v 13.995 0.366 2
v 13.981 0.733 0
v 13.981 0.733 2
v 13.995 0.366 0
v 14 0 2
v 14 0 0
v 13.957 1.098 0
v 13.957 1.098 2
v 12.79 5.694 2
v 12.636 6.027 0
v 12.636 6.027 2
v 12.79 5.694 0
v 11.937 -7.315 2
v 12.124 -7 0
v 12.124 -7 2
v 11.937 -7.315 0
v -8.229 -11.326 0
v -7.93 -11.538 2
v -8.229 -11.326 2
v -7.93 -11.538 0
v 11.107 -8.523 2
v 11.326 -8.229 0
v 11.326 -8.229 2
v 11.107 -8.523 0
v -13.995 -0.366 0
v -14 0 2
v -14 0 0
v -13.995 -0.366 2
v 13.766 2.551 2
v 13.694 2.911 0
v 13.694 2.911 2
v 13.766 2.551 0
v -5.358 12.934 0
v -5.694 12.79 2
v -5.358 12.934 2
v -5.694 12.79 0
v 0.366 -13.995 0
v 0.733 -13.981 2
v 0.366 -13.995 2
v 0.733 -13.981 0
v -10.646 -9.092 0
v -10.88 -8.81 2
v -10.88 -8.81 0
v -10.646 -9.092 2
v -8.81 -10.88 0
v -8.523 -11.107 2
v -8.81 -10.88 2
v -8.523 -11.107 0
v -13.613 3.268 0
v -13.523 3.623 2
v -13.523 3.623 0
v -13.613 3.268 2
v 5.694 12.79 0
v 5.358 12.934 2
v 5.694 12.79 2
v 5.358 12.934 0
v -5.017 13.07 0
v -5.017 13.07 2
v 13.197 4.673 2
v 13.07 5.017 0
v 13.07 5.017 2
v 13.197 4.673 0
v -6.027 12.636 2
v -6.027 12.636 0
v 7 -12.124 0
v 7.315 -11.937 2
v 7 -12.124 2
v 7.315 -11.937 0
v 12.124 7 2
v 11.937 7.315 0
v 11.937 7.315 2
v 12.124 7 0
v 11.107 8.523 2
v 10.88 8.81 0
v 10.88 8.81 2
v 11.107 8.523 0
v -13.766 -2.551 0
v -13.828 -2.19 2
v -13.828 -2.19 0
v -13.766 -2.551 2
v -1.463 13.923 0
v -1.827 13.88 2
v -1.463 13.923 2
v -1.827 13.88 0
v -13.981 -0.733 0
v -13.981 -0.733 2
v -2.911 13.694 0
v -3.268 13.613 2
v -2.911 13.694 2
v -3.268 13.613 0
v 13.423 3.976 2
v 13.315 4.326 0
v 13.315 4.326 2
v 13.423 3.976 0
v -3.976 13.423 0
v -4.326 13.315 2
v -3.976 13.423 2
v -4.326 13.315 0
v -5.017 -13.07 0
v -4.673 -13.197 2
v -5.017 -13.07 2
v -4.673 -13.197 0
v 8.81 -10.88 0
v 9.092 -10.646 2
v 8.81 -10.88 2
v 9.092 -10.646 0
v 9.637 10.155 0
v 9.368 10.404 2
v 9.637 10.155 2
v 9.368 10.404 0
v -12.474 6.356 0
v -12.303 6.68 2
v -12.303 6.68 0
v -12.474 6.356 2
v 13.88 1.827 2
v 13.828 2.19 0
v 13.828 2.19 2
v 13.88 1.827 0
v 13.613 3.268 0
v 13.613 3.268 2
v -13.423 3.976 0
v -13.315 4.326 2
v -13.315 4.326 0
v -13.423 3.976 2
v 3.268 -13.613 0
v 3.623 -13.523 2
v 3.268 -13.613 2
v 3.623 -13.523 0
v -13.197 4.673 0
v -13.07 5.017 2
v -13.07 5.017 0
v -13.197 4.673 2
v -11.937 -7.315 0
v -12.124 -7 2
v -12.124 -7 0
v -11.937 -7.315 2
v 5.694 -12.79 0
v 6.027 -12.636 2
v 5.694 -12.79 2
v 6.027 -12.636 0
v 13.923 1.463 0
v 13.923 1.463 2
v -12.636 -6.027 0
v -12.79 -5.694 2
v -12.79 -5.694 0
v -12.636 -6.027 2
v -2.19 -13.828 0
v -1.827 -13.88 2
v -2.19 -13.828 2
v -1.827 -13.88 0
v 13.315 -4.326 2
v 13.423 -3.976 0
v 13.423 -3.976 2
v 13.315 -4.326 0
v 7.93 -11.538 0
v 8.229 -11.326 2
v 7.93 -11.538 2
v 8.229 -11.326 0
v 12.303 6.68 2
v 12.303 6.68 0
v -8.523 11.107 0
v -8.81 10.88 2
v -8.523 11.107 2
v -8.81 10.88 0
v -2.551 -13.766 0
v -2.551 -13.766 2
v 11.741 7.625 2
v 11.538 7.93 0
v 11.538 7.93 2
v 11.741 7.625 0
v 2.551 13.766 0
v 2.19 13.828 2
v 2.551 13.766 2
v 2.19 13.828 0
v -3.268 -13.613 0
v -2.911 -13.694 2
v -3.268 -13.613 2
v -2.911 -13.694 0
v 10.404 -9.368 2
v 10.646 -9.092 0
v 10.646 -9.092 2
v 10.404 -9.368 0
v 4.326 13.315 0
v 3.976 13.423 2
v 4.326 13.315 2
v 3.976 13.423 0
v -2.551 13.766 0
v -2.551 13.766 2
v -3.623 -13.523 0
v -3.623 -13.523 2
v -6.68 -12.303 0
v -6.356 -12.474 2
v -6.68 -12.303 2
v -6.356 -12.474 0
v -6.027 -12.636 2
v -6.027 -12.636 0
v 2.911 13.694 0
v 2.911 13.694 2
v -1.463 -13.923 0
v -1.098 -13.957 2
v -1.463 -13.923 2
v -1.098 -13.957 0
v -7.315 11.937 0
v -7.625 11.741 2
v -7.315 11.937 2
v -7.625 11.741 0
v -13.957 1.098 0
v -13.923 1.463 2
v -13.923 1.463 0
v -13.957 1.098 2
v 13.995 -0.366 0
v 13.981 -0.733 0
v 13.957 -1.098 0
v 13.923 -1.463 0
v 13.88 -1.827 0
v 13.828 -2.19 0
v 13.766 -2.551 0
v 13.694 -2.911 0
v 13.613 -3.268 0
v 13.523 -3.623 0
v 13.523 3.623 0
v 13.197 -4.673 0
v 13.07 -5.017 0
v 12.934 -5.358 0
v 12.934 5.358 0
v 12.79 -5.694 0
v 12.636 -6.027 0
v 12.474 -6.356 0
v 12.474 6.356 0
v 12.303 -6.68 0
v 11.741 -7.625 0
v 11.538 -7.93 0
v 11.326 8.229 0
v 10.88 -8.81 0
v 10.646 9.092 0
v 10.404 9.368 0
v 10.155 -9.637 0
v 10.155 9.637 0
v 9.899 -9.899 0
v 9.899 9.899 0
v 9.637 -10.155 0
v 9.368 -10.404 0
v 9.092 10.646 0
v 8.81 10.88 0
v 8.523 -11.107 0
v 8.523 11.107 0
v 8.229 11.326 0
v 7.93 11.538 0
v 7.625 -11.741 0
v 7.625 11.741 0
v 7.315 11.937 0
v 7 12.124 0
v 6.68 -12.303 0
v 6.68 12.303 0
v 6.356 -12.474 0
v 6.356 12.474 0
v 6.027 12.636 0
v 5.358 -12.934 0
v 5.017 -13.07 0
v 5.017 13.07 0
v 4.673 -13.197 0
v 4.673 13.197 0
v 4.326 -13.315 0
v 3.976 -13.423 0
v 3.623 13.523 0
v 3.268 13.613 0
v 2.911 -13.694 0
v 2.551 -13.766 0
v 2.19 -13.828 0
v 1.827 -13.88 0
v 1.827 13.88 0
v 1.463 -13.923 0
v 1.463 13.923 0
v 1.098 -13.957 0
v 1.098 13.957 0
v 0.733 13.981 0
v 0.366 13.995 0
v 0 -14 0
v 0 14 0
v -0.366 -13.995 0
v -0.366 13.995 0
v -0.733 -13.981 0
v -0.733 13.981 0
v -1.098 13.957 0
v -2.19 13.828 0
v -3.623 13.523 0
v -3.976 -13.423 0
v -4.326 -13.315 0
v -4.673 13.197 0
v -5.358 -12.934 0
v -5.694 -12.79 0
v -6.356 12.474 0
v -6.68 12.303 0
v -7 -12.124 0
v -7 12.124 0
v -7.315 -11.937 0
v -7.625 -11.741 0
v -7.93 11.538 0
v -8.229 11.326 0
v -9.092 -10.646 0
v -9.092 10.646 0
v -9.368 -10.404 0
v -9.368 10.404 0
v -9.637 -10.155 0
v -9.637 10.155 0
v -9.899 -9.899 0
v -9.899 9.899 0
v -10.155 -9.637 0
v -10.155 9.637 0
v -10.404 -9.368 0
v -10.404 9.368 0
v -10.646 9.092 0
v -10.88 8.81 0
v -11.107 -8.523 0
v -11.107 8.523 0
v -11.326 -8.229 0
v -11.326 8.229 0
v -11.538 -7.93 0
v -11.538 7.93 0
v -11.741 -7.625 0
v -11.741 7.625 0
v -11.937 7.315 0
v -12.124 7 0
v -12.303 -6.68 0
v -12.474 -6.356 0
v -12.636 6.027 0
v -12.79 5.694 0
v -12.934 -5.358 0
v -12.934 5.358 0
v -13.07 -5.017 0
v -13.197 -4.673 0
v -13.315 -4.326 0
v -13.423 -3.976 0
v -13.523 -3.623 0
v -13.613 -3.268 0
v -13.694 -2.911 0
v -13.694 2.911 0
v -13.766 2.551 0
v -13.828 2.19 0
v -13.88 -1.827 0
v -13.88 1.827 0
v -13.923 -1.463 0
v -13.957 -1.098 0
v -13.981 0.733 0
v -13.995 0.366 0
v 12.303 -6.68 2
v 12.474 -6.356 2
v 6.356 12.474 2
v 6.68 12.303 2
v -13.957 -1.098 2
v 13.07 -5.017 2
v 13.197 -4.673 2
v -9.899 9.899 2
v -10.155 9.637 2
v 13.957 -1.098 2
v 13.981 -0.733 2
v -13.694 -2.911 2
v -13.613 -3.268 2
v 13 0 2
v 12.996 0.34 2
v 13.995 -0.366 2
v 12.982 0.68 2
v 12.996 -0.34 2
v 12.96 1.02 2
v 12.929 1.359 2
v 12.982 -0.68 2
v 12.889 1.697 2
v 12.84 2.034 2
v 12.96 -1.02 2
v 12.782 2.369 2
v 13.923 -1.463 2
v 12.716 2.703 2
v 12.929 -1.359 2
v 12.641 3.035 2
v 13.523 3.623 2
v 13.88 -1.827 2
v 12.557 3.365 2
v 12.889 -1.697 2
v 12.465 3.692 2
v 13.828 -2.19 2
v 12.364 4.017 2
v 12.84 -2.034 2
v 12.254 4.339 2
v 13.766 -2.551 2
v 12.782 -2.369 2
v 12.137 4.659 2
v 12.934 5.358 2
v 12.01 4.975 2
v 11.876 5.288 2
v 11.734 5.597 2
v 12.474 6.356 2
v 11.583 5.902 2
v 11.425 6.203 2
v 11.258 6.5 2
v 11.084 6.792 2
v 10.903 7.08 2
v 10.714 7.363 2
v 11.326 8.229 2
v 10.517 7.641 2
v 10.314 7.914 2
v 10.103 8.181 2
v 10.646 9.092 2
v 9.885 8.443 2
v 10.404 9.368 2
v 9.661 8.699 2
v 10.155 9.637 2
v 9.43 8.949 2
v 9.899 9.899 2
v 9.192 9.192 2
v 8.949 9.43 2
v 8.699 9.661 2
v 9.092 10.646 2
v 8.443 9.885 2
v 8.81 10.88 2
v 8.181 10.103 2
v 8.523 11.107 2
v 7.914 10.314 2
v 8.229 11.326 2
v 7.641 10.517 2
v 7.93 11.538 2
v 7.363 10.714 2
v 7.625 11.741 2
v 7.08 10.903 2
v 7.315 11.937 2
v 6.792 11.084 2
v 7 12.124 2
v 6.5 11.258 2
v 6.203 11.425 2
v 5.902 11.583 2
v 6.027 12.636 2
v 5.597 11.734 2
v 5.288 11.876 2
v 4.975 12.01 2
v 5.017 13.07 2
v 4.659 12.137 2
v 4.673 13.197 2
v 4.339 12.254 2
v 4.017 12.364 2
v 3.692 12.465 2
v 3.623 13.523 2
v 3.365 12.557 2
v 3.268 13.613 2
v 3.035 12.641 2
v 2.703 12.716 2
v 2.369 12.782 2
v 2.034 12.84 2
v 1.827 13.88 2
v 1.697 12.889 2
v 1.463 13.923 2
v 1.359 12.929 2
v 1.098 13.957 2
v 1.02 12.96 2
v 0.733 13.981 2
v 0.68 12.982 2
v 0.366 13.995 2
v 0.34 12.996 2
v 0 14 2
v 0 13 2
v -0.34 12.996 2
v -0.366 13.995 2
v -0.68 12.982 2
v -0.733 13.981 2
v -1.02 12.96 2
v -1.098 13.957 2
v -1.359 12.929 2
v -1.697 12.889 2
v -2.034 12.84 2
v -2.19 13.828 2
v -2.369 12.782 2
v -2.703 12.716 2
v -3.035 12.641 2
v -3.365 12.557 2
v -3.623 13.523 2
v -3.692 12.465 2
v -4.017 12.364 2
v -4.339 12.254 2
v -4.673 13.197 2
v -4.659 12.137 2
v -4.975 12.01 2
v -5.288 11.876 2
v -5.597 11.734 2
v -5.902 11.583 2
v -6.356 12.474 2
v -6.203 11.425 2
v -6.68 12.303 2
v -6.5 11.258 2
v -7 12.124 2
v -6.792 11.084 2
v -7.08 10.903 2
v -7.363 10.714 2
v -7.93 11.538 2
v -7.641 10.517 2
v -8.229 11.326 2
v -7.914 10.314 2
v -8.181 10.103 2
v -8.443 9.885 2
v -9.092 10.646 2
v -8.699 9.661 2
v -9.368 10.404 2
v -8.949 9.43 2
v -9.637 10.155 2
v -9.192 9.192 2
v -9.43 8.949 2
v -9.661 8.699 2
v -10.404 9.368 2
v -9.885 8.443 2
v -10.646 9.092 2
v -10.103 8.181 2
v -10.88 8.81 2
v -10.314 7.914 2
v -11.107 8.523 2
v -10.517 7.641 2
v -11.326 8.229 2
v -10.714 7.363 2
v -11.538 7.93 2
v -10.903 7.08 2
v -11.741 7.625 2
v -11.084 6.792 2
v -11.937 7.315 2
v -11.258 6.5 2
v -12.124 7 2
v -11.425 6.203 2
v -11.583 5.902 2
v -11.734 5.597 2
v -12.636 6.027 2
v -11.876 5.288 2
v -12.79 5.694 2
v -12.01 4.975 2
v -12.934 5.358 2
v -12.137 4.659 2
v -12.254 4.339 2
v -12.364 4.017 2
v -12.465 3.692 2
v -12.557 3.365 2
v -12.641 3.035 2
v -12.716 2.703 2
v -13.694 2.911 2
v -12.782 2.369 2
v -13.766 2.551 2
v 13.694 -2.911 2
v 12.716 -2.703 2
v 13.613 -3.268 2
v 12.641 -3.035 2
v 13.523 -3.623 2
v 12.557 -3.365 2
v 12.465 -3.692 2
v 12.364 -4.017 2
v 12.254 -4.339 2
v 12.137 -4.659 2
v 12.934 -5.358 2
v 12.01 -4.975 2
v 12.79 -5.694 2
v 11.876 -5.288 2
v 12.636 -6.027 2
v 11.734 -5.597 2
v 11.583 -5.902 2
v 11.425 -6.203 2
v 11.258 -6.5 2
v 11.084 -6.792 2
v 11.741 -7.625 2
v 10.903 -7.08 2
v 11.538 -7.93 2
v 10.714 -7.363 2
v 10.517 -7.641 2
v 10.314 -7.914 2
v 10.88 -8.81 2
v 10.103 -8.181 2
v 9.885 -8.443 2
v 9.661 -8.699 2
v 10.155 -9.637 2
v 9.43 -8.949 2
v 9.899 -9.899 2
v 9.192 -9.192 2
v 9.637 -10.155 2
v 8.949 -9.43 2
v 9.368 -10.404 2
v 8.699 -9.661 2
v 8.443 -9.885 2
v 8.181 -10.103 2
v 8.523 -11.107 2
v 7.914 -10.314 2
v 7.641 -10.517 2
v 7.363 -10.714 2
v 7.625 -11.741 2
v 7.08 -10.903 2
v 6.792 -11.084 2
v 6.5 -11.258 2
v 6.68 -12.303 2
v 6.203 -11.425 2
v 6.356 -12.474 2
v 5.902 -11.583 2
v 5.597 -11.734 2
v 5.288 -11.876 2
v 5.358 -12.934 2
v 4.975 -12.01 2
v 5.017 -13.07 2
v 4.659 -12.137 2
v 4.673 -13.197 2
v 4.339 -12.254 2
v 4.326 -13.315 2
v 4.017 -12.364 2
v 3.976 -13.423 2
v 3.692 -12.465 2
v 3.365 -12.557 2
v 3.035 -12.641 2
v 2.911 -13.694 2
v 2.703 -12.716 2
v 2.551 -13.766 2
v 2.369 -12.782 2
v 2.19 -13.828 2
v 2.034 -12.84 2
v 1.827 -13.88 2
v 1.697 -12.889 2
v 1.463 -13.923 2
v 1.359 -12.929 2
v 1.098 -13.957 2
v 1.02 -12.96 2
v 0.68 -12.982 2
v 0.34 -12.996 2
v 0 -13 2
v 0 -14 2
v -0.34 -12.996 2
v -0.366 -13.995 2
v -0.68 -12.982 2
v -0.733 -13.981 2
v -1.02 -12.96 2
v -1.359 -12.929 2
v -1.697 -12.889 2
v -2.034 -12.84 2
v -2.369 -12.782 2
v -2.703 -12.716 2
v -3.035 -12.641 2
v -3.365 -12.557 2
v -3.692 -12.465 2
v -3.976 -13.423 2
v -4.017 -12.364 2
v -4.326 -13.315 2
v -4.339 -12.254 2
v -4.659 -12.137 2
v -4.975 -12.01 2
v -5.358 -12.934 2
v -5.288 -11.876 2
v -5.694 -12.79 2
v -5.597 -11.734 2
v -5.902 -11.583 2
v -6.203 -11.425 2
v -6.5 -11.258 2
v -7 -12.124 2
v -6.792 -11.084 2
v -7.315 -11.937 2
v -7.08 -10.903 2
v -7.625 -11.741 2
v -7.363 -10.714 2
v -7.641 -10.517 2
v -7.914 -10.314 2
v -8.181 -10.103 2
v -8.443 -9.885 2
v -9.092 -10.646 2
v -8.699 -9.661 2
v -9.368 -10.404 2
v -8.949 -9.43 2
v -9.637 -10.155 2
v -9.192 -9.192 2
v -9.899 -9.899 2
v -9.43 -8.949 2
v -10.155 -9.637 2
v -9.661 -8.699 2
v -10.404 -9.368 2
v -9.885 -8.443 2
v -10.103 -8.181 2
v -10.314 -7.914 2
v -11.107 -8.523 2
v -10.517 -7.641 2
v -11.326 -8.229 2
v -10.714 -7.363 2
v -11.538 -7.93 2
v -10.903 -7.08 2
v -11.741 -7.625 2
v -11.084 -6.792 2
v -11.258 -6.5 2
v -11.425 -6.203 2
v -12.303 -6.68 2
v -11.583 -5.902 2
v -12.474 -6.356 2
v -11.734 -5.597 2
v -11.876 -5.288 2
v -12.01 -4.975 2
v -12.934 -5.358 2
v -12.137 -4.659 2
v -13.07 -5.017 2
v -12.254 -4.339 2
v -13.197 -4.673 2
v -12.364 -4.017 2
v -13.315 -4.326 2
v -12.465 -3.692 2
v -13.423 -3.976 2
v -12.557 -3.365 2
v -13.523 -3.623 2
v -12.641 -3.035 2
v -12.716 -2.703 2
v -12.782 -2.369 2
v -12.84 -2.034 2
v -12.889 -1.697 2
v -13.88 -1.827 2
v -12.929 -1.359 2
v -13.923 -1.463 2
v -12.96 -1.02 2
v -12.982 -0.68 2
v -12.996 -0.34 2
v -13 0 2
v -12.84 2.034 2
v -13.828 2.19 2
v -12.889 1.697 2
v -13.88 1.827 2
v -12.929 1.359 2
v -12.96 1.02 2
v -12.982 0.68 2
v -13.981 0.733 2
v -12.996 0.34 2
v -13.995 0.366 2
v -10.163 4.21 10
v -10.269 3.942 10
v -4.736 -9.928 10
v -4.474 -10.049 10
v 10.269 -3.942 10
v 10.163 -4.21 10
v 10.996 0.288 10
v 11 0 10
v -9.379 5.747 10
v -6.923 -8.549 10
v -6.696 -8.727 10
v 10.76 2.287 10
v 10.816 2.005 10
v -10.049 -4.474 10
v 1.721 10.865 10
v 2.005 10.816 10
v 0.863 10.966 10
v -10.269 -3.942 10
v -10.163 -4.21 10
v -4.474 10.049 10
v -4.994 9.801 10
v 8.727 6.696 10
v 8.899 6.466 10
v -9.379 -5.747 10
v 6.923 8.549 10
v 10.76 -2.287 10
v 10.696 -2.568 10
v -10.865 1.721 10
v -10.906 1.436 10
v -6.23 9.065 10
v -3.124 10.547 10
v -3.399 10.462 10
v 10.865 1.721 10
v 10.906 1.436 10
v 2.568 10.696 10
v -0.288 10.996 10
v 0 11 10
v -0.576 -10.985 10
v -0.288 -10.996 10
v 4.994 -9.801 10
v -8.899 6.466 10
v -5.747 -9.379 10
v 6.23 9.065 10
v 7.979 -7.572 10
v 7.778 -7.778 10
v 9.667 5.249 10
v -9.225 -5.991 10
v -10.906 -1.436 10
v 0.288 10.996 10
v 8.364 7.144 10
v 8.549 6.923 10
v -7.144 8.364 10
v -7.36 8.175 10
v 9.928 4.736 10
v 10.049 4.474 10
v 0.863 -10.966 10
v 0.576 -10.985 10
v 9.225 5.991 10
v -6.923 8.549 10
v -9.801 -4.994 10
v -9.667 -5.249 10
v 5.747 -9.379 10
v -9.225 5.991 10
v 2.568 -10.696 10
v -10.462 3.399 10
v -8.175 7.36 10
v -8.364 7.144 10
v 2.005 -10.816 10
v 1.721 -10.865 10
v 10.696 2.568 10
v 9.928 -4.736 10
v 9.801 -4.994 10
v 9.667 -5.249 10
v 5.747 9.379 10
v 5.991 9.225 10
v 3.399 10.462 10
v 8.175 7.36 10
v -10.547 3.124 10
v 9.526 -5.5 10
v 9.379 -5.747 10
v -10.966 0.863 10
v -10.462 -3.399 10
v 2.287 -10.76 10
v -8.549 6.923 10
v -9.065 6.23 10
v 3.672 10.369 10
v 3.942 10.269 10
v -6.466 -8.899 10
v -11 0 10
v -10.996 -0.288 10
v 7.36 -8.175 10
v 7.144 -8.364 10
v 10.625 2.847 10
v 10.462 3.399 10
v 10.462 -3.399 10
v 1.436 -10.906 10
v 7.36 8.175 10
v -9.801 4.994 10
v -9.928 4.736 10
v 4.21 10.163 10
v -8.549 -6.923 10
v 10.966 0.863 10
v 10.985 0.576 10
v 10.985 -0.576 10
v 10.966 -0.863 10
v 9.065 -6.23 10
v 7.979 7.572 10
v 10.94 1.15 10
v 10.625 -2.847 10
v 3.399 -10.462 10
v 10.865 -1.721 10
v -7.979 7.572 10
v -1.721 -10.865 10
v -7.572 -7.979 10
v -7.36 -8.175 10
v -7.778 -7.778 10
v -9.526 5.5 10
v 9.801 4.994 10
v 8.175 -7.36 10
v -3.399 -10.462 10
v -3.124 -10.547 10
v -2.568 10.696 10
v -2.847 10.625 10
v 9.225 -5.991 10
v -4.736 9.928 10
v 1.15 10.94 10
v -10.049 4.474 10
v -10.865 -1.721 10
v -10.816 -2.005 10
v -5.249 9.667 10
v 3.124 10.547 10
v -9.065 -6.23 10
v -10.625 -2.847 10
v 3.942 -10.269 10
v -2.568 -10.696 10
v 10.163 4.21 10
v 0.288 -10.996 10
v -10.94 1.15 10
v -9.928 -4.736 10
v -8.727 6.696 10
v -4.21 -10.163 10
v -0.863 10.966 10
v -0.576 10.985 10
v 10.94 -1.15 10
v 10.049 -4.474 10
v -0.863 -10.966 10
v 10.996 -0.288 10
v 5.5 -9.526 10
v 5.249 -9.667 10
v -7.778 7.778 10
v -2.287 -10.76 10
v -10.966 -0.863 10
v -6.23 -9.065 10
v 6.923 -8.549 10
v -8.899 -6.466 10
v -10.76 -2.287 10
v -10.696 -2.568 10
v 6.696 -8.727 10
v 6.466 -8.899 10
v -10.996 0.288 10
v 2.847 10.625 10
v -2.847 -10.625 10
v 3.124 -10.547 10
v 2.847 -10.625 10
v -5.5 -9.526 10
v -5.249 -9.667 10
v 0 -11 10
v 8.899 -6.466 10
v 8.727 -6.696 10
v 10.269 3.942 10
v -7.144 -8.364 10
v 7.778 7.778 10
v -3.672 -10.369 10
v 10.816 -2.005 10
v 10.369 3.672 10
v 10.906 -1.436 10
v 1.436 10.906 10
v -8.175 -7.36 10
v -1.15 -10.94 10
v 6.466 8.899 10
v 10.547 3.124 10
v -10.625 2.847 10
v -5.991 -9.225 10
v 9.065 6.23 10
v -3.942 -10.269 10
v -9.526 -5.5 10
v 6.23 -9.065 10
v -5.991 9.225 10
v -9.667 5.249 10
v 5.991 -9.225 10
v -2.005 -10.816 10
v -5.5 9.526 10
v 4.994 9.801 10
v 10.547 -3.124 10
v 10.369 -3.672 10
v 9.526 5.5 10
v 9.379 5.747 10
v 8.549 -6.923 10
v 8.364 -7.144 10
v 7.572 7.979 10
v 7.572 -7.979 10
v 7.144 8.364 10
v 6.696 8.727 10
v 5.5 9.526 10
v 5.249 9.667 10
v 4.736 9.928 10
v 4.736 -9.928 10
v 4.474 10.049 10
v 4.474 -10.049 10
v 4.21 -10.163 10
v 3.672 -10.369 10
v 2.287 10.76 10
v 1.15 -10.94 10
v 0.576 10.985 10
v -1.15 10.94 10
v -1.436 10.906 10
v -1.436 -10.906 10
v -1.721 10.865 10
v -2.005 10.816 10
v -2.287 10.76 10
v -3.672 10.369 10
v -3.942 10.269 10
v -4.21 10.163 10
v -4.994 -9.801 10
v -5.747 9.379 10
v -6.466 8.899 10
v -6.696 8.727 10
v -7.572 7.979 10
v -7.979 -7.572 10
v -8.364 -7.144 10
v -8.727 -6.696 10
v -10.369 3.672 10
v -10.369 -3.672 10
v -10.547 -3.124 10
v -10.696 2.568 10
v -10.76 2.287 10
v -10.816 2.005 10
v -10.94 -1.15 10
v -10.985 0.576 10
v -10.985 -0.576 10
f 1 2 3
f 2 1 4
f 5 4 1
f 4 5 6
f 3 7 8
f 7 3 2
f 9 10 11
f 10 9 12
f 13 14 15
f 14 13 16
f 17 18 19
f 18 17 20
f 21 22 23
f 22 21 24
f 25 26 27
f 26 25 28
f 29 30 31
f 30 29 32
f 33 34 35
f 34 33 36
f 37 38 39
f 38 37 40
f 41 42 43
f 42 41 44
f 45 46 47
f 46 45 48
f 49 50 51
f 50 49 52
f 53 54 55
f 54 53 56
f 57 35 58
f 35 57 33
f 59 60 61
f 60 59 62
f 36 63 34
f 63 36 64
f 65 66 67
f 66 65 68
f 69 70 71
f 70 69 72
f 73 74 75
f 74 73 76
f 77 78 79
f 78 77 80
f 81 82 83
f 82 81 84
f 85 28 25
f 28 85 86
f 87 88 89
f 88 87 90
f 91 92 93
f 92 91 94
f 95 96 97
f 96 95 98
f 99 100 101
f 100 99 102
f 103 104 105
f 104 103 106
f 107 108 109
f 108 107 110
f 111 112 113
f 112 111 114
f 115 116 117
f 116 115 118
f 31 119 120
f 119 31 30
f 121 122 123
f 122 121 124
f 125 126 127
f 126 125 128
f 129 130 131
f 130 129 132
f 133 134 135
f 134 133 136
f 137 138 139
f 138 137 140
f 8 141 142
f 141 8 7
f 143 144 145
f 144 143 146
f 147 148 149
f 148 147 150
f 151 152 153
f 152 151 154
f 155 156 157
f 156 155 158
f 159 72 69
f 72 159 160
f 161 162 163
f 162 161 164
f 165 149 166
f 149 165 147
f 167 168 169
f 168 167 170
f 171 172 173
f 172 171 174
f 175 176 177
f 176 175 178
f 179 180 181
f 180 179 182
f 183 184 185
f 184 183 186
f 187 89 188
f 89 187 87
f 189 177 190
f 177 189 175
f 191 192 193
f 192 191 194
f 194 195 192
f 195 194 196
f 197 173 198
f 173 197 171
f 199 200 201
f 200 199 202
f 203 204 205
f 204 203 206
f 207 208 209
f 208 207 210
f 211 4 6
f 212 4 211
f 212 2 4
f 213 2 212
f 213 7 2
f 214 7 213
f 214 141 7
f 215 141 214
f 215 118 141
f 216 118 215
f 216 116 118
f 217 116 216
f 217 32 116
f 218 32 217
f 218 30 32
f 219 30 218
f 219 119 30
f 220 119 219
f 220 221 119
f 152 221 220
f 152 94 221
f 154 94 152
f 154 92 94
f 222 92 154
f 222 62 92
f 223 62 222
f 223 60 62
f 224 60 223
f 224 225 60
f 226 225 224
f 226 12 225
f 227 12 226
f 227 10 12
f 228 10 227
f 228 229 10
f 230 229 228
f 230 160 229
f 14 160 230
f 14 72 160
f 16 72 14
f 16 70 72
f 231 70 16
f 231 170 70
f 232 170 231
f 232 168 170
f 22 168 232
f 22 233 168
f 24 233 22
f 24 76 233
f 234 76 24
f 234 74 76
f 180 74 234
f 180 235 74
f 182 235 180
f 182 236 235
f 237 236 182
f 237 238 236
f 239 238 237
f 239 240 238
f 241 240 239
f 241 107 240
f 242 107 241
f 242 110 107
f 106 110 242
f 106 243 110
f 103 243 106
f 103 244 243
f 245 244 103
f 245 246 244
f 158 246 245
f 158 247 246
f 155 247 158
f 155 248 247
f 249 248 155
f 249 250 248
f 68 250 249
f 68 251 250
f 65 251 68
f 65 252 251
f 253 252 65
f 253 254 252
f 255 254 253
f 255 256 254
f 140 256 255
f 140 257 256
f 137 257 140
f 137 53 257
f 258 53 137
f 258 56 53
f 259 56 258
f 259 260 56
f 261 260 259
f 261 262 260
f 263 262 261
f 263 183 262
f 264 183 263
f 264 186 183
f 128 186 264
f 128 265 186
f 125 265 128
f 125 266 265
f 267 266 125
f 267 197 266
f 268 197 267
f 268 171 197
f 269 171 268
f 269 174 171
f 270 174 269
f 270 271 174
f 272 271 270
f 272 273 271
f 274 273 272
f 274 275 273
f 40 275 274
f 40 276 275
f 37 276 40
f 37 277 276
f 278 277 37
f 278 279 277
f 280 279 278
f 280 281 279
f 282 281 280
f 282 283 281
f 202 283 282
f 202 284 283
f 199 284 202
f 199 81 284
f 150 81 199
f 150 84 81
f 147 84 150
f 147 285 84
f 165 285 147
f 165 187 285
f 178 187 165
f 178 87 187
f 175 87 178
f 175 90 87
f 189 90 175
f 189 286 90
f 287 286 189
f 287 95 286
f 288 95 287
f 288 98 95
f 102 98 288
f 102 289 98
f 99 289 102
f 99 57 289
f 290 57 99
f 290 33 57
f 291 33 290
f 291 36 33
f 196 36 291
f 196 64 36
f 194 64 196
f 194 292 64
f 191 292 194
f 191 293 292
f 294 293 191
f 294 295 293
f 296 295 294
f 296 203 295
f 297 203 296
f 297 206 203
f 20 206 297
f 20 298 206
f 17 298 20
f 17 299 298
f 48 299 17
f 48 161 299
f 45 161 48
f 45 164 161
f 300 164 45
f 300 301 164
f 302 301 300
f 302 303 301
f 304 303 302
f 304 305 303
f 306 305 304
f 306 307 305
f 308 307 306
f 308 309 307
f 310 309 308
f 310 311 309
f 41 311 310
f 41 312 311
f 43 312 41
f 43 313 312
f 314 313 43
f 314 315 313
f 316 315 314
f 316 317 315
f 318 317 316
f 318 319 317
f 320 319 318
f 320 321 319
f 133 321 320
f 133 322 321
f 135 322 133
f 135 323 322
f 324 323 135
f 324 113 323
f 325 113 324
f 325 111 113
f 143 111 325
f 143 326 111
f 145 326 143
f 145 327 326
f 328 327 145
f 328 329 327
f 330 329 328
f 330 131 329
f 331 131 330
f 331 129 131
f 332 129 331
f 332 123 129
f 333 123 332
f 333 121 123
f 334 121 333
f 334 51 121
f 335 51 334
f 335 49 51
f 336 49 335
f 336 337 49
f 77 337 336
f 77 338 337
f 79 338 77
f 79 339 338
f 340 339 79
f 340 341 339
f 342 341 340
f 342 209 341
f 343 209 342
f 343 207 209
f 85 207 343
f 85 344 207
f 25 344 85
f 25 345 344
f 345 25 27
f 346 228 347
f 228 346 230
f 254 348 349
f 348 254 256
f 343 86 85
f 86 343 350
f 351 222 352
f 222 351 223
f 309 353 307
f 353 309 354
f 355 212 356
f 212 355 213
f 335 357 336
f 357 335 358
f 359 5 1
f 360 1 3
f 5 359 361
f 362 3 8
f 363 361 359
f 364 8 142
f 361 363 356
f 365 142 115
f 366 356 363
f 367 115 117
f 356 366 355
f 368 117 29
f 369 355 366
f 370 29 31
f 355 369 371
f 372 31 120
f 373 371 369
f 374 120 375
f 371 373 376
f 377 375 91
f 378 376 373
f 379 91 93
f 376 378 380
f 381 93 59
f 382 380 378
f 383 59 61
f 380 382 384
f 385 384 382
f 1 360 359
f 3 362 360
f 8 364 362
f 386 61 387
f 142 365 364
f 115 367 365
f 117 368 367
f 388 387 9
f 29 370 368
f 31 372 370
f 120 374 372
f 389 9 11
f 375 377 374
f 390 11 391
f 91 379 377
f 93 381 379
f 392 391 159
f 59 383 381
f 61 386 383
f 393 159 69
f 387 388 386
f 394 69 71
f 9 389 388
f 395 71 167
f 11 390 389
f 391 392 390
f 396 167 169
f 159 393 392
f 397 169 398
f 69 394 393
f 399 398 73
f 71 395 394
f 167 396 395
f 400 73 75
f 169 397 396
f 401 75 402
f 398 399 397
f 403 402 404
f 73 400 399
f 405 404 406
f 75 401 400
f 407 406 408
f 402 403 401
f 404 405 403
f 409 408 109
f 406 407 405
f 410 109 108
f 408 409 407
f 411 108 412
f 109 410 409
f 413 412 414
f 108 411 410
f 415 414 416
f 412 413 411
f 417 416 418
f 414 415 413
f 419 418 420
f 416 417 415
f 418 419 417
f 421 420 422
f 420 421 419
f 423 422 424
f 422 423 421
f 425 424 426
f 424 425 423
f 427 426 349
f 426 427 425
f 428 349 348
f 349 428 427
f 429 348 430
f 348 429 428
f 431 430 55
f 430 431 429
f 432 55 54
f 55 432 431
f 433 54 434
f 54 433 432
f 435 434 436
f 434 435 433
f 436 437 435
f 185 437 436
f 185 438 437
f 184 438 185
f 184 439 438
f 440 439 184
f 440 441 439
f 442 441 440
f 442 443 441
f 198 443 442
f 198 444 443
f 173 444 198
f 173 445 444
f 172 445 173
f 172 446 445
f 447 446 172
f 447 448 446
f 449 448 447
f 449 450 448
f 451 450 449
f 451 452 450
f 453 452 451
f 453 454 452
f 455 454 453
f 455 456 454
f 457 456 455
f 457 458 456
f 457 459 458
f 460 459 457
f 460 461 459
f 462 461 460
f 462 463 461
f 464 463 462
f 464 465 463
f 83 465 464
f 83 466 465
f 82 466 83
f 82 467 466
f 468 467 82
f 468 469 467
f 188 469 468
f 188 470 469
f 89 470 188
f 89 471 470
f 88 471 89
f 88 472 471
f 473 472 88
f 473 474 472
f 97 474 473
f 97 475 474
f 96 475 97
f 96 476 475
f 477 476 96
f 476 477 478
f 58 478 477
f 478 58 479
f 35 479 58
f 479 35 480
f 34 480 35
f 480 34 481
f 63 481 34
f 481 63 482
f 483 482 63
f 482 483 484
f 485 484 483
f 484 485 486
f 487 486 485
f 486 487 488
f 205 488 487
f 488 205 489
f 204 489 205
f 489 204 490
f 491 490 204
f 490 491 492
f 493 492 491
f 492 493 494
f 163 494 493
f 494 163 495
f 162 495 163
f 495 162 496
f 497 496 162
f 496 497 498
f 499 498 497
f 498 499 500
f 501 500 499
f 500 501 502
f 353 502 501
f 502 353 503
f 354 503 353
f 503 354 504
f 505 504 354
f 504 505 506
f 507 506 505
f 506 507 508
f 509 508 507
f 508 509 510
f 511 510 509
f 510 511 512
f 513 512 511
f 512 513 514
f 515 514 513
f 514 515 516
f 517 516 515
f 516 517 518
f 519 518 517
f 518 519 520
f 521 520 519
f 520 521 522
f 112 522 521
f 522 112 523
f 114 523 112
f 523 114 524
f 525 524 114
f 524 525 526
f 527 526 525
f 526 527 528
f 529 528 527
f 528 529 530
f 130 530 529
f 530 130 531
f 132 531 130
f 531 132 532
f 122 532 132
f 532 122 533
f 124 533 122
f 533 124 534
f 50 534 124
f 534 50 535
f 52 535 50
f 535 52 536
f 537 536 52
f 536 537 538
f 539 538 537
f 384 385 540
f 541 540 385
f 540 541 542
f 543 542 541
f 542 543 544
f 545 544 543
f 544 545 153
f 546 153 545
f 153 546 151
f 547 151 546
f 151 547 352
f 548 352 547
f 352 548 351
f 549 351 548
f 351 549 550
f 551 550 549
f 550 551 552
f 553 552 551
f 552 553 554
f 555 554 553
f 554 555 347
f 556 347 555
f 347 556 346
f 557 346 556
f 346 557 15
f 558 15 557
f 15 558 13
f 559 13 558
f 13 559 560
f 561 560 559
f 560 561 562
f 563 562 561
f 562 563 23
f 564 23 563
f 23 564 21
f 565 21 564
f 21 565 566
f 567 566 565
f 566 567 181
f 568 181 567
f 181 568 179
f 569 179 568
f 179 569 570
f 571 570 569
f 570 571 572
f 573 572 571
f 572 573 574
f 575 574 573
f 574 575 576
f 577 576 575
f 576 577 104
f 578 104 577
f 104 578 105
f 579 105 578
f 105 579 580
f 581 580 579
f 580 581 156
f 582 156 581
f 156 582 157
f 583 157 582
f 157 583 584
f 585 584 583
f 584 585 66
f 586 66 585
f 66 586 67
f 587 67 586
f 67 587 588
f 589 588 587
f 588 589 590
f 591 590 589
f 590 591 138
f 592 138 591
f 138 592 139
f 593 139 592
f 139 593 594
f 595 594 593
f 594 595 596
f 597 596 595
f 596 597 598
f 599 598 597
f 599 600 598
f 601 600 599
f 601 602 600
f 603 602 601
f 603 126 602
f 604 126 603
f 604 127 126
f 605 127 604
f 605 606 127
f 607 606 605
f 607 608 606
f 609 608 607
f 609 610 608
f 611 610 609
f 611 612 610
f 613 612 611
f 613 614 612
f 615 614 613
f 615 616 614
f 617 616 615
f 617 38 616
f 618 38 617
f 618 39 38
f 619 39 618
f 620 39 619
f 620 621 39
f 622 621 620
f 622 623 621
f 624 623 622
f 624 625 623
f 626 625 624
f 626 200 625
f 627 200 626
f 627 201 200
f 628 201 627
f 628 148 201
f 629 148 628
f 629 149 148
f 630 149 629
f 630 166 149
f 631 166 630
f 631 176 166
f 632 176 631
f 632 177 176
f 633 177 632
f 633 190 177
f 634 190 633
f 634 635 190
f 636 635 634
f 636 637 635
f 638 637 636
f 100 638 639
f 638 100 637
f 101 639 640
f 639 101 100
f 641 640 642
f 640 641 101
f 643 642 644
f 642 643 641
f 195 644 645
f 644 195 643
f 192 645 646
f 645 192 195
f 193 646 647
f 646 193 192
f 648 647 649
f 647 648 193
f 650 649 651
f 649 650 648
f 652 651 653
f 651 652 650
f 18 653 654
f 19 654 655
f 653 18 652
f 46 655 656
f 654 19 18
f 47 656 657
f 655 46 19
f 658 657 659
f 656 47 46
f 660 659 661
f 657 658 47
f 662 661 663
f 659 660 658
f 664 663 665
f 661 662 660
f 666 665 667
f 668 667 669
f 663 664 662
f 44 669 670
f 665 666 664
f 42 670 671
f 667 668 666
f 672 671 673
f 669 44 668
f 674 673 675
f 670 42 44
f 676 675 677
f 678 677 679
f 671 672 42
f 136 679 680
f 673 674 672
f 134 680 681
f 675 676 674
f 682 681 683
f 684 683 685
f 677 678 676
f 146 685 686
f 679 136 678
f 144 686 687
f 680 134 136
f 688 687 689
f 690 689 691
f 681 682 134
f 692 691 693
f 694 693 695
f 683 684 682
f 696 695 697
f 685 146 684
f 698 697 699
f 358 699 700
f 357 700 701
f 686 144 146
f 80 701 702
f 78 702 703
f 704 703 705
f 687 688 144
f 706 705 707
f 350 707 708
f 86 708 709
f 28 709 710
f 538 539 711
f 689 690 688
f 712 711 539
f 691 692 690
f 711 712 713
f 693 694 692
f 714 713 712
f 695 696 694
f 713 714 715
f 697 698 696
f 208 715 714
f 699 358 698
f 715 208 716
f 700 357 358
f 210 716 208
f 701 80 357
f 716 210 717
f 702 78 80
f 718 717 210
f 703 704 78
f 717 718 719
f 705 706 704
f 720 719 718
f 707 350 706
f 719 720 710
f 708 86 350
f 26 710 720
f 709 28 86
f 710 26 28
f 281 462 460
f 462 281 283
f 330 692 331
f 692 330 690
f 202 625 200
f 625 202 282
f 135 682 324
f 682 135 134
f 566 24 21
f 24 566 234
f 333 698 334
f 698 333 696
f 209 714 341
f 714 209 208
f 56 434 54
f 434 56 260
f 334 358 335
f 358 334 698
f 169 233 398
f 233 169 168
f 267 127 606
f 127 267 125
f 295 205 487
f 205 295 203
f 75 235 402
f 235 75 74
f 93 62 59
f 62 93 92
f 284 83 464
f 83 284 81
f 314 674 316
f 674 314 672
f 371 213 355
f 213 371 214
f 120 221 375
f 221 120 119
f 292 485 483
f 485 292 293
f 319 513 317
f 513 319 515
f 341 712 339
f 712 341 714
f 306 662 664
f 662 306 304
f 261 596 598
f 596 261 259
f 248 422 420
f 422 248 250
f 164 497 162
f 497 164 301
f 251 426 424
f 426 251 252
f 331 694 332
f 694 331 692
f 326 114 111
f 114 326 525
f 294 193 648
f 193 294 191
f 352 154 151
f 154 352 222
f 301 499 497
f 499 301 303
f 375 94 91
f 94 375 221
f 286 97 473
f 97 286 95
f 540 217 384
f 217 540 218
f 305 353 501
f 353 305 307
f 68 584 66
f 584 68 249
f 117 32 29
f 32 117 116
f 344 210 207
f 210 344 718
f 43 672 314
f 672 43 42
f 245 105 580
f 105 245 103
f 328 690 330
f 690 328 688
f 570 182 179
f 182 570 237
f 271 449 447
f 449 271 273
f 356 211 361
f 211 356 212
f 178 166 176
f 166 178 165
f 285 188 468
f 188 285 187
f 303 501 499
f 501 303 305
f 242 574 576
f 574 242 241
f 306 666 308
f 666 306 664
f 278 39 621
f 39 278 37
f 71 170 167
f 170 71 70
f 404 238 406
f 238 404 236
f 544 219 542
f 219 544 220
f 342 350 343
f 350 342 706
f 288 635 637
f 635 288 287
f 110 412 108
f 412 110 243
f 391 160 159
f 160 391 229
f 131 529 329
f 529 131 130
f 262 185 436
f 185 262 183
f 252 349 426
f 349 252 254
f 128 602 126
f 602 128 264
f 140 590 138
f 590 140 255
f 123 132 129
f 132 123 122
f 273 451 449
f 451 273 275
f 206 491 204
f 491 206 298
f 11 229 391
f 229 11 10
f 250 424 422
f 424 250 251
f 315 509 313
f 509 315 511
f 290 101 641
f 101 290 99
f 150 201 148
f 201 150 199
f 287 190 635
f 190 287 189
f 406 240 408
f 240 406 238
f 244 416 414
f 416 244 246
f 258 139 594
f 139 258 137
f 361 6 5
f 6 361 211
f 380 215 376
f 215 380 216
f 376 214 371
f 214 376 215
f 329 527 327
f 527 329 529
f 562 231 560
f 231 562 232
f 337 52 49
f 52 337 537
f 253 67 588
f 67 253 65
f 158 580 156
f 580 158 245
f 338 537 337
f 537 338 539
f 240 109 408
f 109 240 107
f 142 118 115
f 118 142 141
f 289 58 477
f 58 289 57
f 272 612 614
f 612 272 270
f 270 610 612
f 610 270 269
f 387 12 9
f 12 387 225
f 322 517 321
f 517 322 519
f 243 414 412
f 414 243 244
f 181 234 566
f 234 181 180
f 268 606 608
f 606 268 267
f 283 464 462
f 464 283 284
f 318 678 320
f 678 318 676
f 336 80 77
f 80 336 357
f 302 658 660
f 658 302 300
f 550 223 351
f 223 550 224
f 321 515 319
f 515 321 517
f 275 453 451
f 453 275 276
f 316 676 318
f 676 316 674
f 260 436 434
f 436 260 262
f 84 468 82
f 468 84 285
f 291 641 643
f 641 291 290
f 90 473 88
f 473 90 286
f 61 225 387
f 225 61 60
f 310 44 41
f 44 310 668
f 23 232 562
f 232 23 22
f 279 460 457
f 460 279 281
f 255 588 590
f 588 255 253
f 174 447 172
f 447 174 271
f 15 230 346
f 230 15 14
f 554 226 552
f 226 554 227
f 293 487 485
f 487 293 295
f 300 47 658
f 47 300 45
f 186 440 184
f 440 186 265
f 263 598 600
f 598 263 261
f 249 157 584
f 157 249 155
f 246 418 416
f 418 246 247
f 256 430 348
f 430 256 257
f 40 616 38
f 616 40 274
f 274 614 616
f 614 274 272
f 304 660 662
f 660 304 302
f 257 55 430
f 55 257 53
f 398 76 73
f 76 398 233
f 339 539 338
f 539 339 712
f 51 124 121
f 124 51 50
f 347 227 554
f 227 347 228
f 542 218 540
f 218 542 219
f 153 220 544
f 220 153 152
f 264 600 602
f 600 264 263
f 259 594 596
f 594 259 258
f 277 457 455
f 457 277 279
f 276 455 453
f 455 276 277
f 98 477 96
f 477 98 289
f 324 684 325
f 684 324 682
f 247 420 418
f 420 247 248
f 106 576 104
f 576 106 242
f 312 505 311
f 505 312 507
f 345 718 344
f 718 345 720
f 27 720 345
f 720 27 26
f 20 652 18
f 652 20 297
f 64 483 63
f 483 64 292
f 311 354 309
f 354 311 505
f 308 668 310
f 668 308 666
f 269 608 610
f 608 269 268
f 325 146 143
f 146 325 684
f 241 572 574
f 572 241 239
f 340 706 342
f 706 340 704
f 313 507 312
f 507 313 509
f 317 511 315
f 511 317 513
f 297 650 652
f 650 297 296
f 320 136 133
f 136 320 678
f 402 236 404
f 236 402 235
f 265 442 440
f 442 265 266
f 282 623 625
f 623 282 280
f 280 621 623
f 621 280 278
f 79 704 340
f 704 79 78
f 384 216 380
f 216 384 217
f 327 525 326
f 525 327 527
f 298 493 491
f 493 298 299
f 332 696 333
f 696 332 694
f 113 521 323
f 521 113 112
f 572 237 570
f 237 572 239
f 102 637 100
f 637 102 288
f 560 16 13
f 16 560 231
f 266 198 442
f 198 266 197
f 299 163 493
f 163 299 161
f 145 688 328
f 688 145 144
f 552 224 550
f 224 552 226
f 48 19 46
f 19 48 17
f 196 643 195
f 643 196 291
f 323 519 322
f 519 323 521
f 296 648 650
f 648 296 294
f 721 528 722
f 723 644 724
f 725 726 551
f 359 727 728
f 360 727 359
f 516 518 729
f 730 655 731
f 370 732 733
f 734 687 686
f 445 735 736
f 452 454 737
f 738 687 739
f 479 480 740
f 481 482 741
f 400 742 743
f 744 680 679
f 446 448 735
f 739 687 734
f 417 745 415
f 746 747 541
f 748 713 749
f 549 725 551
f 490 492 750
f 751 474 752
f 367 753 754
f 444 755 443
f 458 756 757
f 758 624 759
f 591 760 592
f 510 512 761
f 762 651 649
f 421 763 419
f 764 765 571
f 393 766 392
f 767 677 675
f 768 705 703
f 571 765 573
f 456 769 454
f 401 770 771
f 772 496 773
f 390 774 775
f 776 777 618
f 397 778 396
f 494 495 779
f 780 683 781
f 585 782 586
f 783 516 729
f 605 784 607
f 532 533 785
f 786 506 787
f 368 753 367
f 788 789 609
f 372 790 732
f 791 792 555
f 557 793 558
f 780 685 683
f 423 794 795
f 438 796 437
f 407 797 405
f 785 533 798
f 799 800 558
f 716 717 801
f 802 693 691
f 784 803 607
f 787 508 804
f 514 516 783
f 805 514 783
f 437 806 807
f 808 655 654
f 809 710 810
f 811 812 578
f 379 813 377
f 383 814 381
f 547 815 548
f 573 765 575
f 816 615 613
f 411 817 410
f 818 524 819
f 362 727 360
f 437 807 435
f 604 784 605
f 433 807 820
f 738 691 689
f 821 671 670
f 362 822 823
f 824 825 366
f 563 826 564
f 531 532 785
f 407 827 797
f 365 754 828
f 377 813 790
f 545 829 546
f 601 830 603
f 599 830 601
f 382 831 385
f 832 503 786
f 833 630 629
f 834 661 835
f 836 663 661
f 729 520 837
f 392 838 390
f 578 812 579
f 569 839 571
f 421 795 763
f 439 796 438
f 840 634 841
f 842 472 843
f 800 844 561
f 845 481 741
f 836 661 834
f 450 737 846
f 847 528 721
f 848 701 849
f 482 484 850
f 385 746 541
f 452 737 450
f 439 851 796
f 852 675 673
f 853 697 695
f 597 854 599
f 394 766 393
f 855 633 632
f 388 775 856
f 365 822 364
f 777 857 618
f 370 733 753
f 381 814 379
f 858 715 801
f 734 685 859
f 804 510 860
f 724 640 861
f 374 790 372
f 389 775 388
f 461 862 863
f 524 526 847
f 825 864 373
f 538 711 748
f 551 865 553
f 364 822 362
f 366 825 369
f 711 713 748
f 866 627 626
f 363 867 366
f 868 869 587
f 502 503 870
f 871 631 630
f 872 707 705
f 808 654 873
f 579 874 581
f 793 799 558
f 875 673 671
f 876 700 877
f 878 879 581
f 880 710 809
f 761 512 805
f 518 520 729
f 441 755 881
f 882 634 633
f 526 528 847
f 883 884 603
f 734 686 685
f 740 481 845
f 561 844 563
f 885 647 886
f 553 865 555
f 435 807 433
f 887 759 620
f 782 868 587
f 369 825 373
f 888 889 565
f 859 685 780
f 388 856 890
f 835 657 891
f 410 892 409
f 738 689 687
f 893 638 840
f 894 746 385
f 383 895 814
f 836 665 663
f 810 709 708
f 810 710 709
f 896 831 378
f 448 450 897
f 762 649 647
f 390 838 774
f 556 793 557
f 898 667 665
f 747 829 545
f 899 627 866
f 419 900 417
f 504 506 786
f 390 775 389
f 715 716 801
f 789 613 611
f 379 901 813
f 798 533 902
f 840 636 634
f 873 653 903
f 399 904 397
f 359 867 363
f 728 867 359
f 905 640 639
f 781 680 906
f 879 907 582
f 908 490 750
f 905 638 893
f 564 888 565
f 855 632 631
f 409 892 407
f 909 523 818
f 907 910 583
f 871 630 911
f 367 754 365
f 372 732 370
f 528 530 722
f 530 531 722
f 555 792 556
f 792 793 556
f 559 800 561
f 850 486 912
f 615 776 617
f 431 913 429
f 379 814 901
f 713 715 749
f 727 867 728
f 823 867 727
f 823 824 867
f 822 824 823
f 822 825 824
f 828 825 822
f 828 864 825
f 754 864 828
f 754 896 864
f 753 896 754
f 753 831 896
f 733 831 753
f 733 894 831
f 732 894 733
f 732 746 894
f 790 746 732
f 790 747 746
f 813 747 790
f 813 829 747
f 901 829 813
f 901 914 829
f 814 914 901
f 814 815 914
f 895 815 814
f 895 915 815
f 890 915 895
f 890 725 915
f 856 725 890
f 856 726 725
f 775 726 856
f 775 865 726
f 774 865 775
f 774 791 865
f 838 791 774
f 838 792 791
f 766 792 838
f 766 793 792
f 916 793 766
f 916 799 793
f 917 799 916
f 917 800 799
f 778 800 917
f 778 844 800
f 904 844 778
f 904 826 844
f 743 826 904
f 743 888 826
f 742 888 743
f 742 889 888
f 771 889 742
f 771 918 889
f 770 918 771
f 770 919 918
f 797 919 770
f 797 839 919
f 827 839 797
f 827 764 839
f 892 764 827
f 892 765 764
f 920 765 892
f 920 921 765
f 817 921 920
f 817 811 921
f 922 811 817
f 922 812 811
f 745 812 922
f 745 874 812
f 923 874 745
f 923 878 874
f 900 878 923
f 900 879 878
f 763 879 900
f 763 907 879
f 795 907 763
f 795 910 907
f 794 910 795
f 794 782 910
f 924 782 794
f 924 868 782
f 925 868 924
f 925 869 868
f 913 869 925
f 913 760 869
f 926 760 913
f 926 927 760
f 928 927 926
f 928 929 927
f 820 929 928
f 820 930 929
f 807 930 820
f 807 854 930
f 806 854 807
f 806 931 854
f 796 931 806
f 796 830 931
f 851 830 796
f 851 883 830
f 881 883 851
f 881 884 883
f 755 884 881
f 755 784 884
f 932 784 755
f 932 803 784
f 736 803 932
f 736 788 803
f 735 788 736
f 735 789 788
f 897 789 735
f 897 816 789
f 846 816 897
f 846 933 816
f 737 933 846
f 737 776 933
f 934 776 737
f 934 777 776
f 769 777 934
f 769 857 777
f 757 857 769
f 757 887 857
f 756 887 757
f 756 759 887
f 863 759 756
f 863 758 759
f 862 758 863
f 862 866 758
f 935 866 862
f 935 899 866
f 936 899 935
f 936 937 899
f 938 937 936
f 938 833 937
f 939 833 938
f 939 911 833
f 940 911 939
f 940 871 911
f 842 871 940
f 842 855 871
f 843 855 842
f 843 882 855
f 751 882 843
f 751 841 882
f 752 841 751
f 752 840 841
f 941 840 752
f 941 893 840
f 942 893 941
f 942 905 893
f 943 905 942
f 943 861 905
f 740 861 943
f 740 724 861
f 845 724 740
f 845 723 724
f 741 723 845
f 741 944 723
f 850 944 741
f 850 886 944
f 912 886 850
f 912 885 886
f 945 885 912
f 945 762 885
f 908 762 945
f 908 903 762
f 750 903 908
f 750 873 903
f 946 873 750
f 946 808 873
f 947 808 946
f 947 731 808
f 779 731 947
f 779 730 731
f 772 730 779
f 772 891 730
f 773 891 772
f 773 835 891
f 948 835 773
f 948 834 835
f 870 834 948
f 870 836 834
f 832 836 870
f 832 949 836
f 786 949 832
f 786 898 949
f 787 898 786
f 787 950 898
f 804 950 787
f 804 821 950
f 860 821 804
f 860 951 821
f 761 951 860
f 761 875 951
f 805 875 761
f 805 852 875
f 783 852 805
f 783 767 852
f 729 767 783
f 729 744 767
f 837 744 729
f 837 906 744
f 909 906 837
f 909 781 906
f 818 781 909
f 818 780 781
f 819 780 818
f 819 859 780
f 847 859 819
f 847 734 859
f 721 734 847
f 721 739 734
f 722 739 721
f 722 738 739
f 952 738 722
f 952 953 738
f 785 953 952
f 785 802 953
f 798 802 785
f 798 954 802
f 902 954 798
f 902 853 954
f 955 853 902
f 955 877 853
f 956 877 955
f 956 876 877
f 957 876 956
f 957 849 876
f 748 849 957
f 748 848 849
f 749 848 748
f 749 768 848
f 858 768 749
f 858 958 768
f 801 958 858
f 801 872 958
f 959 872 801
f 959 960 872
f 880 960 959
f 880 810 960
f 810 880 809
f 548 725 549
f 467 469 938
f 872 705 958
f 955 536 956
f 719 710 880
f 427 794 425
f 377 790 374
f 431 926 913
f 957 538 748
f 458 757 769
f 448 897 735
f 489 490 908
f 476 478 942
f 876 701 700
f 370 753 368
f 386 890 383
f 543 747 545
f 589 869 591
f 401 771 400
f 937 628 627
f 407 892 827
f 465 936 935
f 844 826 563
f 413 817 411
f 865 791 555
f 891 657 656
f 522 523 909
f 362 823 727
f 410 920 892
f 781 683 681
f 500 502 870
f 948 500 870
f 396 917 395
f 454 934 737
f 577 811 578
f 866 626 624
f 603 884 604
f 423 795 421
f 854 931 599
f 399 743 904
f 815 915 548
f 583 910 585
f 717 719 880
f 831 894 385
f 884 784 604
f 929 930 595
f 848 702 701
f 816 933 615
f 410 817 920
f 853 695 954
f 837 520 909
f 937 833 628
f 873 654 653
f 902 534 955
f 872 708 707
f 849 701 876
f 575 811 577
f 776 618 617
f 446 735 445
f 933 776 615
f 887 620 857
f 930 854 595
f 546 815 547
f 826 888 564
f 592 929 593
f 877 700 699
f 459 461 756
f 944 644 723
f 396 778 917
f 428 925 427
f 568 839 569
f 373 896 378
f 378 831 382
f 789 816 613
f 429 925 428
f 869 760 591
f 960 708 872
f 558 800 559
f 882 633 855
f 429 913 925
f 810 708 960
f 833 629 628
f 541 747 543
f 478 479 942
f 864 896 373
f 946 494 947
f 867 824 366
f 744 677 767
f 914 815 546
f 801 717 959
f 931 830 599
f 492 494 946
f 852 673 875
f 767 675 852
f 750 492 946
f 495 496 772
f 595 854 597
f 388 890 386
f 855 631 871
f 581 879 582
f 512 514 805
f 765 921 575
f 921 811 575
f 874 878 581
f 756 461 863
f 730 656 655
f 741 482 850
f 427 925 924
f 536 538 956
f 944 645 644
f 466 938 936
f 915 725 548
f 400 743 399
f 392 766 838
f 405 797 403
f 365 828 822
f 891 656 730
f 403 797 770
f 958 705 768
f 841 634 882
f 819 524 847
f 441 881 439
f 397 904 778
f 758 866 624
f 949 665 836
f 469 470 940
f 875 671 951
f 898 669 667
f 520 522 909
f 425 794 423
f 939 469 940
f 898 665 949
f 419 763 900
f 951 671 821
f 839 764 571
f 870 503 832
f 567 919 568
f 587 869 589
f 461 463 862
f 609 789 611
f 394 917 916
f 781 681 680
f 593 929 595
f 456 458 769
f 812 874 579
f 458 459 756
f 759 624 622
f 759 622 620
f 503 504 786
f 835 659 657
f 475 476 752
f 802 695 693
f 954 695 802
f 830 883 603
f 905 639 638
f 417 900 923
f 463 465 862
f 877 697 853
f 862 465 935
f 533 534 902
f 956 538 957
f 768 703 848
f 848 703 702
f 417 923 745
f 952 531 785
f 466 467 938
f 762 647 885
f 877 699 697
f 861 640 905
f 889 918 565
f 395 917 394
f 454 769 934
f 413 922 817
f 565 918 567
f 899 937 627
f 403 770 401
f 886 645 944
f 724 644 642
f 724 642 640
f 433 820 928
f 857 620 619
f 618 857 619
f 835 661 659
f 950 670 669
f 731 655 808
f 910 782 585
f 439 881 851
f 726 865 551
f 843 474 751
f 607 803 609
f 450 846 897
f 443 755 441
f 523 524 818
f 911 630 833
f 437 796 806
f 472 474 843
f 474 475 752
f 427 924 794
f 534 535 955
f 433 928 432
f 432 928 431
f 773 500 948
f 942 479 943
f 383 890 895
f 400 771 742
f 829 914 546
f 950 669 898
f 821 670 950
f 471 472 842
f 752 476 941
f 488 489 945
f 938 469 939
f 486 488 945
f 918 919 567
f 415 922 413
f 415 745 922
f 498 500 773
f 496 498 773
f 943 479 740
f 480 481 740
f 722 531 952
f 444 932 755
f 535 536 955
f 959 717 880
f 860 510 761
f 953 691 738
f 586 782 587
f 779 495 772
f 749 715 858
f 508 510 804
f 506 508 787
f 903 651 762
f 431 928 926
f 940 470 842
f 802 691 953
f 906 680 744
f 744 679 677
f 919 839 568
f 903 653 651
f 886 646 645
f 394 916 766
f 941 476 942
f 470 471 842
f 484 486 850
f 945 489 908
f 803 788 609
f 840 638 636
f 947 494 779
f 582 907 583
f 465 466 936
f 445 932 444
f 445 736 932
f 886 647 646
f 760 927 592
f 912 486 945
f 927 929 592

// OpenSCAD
plug_height=8;
plug_radius_small=11;
plug_radius_big=13;
lid_height=2;
lid_radius=14;
/* [Hidden] */
fn=240;

cylinder(r=lid_radius,h=lid_height,$fn=fn);

translate([0,0,lid_height])cylinder(r1=plug_radius_big,r2=plug_radius_small,h=plug_height,$fn=fn);
